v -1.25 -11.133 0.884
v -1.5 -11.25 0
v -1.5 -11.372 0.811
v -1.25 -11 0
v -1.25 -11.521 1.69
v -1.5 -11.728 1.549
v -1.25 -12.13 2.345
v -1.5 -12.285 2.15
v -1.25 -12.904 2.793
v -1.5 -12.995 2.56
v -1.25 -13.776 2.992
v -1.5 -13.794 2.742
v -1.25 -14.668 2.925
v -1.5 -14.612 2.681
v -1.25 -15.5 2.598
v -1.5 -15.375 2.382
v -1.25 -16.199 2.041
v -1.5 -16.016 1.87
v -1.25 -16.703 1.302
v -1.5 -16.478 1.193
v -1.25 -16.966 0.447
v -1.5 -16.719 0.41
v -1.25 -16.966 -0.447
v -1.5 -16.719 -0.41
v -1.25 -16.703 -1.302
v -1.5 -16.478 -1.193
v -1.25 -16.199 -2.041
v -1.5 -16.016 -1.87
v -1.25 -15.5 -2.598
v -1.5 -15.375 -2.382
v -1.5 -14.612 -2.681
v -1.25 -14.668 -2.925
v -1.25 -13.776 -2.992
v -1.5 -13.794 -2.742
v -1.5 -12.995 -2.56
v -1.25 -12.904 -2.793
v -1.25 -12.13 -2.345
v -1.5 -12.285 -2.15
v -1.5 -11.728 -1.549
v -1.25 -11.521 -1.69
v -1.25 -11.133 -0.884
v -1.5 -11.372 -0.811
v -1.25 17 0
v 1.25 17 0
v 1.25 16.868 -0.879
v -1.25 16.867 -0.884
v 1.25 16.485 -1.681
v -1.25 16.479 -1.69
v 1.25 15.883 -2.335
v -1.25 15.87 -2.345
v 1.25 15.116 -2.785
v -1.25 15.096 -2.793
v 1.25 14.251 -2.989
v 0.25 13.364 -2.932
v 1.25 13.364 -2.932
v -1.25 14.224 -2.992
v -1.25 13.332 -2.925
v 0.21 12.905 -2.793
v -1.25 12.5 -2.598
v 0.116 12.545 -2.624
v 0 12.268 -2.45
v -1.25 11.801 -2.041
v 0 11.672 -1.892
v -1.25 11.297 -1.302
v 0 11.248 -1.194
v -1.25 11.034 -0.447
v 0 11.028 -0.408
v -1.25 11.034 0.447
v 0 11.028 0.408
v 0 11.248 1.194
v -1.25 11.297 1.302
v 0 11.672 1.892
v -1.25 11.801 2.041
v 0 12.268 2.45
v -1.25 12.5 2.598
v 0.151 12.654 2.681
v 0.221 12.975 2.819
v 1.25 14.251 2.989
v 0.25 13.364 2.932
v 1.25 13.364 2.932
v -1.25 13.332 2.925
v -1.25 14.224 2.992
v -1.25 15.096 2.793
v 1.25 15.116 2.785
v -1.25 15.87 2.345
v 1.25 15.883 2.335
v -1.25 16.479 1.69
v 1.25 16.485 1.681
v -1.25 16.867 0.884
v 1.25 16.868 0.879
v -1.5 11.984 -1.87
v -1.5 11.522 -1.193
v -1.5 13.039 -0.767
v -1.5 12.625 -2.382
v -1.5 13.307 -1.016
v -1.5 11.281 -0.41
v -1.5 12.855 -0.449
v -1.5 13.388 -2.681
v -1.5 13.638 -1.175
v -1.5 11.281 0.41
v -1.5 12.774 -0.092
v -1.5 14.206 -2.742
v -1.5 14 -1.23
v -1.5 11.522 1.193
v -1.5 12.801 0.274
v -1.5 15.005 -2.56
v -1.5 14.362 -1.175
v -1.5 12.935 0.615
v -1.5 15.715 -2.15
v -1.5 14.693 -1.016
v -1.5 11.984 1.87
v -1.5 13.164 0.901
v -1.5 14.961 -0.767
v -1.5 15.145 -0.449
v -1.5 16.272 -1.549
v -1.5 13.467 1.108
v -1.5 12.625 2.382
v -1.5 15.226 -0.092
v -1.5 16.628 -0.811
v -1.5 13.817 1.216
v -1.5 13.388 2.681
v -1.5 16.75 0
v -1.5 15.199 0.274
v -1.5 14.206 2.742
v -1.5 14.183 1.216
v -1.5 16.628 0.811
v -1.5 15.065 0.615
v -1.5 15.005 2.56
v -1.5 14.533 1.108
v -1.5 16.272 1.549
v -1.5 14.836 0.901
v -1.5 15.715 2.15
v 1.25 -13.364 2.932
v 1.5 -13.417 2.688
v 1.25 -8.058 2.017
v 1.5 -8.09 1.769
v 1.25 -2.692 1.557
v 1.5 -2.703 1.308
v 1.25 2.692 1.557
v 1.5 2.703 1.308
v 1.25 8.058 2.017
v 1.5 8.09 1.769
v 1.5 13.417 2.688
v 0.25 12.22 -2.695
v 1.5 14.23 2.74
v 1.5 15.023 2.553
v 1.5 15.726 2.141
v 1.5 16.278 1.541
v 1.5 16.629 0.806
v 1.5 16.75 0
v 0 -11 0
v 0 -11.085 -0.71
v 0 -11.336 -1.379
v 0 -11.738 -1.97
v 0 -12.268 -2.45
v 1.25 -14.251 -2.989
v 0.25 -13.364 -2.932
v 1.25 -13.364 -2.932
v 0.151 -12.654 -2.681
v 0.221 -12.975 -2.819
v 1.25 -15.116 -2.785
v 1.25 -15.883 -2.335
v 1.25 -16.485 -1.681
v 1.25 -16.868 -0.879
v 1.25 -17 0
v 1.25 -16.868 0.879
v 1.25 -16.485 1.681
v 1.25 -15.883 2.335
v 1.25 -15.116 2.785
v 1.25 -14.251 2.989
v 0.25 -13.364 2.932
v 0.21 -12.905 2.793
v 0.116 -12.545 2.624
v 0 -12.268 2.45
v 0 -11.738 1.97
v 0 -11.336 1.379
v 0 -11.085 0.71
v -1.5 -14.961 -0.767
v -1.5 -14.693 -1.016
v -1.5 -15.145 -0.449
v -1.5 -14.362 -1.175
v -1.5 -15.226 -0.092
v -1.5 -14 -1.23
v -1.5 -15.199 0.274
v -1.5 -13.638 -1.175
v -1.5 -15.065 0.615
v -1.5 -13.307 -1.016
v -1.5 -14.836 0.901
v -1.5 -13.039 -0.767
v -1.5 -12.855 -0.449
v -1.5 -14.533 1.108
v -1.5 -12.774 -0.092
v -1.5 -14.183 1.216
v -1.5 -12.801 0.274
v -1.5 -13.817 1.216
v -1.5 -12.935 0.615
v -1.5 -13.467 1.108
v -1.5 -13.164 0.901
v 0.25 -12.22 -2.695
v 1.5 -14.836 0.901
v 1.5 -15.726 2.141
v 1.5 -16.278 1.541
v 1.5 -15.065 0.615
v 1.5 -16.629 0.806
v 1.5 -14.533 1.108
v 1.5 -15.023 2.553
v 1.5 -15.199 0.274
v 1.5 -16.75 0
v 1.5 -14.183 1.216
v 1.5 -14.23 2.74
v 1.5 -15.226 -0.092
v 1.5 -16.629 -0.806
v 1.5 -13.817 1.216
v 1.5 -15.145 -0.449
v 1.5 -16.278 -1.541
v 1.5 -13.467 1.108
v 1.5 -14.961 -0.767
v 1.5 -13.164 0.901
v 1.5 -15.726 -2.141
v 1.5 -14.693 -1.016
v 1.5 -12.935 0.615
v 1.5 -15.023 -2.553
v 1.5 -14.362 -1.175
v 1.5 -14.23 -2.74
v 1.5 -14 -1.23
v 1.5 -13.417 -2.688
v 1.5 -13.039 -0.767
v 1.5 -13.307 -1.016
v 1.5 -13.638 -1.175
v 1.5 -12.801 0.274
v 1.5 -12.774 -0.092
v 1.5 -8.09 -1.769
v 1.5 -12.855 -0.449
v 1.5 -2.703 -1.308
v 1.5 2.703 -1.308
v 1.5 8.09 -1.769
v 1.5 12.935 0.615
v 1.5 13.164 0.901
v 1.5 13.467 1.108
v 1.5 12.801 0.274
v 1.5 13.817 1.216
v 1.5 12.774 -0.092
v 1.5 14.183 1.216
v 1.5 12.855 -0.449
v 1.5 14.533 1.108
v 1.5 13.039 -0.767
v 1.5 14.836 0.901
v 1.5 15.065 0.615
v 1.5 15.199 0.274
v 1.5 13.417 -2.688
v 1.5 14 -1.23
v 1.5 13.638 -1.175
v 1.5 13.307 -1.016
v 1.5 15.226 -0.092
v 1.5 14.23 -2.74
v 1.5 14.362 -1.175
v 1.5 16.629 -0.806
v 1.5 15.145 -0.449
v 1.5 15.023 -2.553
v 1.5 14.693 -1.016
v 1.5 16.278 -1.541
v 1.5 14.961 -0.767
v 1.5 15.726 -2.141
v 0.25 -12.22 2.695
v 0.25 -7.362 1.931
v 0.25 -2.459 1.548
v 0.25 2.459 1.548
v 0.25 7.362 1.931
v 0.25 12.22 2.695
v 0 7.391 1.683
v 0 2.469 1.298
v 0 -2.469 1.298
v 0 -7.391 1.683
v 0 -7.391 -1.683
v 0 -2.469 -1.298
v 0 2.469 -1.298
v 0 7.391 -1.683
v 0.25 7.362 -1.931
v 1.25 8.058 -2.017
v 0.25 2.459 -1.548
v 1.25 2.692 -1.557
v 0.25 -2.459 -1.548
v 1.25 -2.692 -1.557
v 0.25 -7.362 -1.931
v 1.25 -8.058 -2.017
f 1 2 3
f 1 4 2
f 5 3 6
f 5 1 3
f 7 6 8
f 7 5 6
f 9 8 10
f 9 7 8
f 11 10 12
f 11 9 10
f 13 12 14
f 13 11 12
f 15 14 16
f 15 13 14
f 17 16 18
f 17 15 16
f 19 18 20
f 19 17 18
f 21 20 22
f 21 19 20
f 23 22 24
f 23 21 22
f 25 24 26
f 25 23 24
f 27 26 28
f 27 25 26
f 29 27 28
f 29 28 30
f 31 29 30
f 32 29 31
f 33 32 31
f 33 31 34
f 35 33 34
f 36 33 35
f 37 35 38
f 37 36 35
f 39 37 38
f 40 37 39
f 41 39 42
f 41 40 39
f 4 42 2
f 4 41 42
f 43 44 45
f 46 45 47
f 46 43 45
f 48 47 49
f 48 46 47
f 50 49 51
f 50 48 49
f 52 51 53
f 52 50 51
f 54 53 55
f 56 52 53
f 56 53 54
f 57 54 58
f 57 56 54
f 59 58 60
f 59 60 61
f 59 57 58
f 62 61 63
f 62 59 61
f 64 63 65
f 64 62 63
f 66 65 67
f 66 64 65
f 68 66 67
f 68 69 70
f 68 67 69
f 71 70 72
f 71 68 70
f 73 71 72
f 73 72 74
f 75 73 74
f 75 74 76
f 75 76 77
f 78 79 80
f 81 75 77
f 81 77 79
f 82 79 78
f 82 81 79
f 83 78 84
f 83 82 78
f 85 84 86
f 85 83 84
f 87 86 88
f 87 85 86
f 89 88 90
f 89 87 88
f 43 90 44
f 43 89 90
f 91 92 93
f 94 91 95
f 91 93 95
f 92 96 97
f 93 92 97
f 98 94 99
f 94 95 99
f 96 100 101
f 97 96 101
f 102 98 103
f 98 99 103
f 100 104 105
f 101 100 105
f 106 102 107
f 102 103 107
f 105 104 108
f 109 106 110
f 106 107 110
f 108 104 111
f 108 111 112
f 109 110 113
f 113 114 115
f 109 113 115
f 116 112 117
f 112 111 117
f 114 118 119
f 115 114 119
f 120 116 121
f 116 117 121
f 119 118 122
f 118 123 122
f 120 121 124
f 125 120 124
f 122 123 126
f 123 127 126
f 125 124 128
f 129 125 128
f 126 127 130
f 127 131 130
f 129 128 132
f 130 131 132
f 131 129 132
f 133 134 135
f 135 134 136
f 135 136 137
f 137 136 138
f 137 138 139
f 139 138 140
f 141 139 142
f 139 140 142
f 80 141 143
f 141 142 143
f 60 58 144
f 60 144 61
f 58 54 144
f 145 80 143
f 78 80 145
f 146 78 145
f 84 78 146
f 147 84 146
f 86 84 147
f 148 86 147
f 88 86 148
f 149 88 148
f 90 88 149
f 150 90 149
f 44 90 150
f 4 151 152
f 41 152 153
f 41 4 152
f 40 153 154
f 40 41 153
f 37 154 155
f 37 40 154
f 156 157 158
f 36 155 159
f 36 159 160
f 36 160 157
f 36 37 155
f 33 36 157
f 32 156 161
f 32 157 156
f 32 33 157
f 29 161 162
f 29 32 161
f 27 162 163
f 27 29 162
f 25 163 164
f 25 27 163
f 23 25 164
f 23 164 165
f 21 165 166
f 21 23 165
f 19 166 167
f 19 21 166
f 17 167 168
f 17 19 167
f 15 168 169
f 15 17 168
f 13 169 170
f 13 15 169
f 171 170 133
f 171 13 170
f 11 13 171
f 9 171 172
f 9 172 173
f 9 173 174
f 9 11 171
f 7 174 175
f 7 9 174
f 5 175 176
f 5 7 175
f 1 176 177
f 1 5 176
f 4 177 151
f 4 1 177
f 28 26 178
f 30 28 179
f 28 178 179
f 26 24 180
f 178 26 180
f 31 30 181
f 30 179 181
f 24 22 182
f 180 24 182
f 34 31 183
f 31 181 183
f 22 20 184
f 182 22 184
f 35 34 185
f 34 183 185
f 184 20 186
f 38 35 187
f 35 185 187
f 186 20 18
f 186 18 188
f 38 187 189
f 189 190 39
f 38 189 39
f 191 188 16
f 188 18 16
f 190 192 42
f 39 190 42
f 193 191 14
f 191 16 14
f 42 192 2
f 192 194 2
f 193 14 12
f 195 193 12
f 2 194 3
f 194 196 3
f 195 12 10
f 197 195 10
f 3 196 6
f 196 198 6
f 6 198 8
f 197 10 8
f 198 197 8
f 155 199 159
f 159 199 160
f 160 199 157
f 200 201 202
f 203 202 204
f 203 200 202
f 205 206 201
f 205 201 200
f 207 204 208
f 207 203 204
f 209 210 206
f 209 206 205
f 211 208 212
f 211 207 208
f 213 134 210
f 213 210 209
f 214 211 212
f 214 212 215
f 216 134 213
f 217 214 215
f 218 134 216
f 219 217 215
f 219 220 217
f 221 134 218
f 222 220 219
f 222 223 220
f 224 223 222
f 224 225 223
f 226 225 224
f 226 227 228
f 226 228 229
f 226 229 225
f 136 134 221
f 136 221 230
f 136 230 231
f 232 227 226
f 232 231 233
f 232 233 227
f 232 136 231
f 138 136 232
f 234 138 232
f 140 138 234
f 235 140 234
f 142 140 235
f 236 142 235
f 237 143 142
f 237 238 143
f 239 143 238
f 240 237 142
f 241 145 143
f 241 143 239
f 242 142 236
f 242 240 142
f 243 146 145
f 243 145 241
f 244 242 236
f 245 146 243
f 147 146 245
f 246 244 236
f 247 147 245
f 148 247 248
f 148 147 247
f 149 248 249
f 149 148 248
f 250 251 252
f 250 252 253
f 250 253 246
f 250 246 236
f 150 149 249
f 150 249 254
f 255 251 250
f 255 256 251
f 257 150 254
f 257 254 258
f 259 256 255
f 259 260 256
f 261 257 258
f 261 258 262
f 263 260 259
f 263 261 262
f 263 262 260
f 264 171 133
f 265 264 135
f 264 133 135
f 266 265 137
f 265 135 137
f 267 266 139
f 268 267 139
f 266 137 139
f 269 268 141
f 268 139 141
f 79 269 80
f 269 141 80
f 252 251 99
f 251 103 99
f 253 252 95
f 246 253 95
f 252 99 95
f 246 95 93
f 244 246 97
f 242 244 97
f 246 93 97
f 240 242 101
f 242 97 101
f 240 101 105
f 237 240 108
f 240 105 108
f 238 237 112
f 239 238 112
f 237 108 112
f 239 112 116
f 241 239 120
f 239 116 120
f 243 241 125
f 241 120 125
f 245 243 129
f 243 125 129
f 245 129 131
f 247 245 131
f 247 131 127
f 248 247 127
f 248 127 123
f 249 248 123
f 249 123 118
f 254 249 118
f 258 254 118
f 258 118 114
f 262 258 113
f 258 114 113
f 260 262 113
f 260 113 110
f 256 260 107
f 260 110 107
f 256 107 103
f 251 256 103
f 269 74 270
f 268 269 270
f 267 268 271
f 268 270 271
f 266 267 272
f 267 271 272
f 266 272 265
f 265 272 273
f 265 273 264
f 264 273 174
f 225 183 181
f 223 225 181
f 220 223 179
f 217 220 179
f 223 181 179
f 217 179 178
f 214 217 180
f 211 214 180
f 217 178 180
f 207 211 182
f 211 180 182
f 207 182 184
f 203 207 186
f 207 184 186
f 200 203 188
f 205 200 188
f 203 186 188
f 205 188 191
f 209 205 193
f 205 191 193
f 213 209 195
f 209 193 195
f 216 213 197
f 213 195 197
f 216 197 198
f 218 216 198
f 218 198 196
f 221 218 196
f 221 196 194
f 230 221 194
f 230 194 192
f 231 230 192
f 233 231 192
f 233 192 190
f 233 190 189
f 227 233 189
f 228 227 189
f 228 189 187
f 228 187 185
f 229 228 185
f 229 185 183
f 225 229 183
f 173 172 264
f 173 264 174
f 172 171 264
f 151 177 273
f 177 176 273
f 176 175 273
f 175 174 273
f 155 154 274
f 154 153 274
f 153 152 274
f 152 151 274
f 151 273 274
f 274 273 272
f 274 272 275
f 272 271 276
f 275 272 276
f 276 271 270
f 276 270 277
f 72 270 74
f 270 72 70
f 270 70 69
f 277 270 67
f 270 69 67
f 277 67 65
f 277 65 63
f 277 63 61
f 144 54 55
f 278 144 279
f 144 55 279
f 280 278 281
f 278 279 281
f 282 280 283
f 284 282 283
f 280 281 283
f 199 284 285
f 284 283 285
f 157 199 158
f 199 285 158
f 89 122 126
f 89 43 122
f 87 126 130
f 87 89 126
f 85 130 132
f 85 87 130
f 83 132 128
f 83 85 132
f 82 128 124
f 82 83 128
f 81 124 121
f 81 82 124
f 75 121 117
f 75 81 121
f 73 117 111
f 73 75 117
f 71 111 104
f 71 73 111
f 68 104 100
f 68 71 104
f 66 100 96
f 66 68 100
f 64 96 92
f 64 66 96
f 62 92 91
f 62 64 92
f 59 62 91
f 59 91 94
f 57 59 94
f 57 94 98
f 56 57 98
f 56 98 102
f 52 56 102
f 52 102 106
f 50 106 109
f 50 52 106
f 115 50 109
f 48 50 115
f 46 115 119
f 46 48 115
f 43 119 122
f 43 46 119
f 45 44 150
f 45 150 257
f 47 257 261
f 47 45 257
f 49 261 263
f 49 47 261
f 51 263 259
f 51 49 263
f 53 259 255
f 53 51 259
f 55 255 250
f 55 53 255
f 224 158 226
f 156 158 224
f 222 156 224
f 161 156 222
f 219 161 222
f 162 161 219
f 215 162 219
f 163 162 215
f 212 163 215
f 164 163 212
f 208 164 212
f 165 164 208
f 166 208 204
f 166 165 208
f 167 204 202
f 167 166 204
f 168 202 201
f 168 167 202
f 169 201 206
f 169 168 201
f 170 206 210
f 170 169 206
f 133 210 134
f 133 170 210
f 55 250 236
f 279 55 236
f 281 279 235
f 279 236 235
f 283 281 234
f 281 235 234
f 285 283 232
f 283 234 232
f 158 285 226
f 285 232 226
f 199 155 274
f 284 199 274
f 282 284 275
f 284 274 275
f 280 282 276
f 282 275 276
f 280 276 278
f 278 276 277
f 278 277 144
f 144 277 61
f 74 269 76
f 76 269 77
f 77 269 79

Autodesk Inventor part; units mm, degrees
ref_plane "YZ Plane" through (0, 0, 0) normal (1, 0, 0) x (0, 1, 0)
ref_plane "XZ Plane" through (0, 0, 0) normal (0, 1, 0) x (-1, 0, 0)
ref_plane "XY Plane" through (0, 0, 0) normal (0, 0, 1) x (1, 0, 0)
sketch "Sketch1" plane through (0, 0, 0) normal (1, 0, 0) x (0, 1, 0)
  circle A0 centre (-14, 0) radius 3
  circle A1 centre (14, 0) radius 3
  line L0 (-14, 0) -> (14, 0) construction
  point P0 (0, 0)
  point P1 (0, 0)
  dimension "d0" = 6
  dimension "d1" = 28
extrude "Extrusion1" add sketch "Sketch1" along normal mid plane 3
sketch "Sketch2" plane through (1.5, 14, 0) normal (1, 0, 0) x (0, 0, -1)
  circle A0 centre (0, -28) radius 3 projected
  circle A1 centre (0, 0) radius 3 projected
  circle A2 centre (0, -28) radius 3 projected
  arc A3 (-2.9319, -27.3644) -> (-2.9319, -0.6356) centre (-64.5833, -14) ccw
  arc A4 (2.9319, -0.6356) -> (2.9319, -27.3644) centre (64.5833, -14) ccw
  circle A5 centre (0, 0) radius 3 projected
  point P0 (0, -14)
  dimension "d4" = 3
extrude "Extrusion2" add sketch "Sketch2" against normal blind 1.5 contours A0 A3 A1 A4
sketch "Sketch3" plane through (1.5, 0, 0) normal (1, 0, 0) x (0, 0, -1)
  arc A0 (-2.9319, -13.3644) -> (2.9319, -13.3644) centre (0, -14) ccw projected
  arc A1 (2.9319, 13.3644) -> (2.9319, -13.3644) centre (64.5833, 0) ccw projected
  arc A2 (2.9319, 13.3644) -> (-2.9319, 13.3644) centre (0, 14) ccw projected
  arc A3 (-2.9319, -13.3644) -> (-2.9319, 13.3644) centre (-64.5833, 0) ccw projected
  point P0 (0, 0)
hole "Hole1" at (1.5, 14, 0) at (1.5, -14, 0) direction (-1, 0, 0) diameter 2.459 end through all thread size "M3x0.5" class "6H" standard "ANSI Metric M Profile"
chamfer "Chamfer1" distance 0.25 angle 45 9 edges at (1.5, 0, 1.5) (1.5, -17, 0) (1.5, 0, -1.5) (1.5, 15.8833, -2.3352) (1.5, 15.8833, 2.3352) (-1.5, 11, 0) (-1.5, -17, 0) (0, 0, -1.5) (0, 0, 1.5)
properties part number "Backplane_CenterNut" material "Aluminum"
